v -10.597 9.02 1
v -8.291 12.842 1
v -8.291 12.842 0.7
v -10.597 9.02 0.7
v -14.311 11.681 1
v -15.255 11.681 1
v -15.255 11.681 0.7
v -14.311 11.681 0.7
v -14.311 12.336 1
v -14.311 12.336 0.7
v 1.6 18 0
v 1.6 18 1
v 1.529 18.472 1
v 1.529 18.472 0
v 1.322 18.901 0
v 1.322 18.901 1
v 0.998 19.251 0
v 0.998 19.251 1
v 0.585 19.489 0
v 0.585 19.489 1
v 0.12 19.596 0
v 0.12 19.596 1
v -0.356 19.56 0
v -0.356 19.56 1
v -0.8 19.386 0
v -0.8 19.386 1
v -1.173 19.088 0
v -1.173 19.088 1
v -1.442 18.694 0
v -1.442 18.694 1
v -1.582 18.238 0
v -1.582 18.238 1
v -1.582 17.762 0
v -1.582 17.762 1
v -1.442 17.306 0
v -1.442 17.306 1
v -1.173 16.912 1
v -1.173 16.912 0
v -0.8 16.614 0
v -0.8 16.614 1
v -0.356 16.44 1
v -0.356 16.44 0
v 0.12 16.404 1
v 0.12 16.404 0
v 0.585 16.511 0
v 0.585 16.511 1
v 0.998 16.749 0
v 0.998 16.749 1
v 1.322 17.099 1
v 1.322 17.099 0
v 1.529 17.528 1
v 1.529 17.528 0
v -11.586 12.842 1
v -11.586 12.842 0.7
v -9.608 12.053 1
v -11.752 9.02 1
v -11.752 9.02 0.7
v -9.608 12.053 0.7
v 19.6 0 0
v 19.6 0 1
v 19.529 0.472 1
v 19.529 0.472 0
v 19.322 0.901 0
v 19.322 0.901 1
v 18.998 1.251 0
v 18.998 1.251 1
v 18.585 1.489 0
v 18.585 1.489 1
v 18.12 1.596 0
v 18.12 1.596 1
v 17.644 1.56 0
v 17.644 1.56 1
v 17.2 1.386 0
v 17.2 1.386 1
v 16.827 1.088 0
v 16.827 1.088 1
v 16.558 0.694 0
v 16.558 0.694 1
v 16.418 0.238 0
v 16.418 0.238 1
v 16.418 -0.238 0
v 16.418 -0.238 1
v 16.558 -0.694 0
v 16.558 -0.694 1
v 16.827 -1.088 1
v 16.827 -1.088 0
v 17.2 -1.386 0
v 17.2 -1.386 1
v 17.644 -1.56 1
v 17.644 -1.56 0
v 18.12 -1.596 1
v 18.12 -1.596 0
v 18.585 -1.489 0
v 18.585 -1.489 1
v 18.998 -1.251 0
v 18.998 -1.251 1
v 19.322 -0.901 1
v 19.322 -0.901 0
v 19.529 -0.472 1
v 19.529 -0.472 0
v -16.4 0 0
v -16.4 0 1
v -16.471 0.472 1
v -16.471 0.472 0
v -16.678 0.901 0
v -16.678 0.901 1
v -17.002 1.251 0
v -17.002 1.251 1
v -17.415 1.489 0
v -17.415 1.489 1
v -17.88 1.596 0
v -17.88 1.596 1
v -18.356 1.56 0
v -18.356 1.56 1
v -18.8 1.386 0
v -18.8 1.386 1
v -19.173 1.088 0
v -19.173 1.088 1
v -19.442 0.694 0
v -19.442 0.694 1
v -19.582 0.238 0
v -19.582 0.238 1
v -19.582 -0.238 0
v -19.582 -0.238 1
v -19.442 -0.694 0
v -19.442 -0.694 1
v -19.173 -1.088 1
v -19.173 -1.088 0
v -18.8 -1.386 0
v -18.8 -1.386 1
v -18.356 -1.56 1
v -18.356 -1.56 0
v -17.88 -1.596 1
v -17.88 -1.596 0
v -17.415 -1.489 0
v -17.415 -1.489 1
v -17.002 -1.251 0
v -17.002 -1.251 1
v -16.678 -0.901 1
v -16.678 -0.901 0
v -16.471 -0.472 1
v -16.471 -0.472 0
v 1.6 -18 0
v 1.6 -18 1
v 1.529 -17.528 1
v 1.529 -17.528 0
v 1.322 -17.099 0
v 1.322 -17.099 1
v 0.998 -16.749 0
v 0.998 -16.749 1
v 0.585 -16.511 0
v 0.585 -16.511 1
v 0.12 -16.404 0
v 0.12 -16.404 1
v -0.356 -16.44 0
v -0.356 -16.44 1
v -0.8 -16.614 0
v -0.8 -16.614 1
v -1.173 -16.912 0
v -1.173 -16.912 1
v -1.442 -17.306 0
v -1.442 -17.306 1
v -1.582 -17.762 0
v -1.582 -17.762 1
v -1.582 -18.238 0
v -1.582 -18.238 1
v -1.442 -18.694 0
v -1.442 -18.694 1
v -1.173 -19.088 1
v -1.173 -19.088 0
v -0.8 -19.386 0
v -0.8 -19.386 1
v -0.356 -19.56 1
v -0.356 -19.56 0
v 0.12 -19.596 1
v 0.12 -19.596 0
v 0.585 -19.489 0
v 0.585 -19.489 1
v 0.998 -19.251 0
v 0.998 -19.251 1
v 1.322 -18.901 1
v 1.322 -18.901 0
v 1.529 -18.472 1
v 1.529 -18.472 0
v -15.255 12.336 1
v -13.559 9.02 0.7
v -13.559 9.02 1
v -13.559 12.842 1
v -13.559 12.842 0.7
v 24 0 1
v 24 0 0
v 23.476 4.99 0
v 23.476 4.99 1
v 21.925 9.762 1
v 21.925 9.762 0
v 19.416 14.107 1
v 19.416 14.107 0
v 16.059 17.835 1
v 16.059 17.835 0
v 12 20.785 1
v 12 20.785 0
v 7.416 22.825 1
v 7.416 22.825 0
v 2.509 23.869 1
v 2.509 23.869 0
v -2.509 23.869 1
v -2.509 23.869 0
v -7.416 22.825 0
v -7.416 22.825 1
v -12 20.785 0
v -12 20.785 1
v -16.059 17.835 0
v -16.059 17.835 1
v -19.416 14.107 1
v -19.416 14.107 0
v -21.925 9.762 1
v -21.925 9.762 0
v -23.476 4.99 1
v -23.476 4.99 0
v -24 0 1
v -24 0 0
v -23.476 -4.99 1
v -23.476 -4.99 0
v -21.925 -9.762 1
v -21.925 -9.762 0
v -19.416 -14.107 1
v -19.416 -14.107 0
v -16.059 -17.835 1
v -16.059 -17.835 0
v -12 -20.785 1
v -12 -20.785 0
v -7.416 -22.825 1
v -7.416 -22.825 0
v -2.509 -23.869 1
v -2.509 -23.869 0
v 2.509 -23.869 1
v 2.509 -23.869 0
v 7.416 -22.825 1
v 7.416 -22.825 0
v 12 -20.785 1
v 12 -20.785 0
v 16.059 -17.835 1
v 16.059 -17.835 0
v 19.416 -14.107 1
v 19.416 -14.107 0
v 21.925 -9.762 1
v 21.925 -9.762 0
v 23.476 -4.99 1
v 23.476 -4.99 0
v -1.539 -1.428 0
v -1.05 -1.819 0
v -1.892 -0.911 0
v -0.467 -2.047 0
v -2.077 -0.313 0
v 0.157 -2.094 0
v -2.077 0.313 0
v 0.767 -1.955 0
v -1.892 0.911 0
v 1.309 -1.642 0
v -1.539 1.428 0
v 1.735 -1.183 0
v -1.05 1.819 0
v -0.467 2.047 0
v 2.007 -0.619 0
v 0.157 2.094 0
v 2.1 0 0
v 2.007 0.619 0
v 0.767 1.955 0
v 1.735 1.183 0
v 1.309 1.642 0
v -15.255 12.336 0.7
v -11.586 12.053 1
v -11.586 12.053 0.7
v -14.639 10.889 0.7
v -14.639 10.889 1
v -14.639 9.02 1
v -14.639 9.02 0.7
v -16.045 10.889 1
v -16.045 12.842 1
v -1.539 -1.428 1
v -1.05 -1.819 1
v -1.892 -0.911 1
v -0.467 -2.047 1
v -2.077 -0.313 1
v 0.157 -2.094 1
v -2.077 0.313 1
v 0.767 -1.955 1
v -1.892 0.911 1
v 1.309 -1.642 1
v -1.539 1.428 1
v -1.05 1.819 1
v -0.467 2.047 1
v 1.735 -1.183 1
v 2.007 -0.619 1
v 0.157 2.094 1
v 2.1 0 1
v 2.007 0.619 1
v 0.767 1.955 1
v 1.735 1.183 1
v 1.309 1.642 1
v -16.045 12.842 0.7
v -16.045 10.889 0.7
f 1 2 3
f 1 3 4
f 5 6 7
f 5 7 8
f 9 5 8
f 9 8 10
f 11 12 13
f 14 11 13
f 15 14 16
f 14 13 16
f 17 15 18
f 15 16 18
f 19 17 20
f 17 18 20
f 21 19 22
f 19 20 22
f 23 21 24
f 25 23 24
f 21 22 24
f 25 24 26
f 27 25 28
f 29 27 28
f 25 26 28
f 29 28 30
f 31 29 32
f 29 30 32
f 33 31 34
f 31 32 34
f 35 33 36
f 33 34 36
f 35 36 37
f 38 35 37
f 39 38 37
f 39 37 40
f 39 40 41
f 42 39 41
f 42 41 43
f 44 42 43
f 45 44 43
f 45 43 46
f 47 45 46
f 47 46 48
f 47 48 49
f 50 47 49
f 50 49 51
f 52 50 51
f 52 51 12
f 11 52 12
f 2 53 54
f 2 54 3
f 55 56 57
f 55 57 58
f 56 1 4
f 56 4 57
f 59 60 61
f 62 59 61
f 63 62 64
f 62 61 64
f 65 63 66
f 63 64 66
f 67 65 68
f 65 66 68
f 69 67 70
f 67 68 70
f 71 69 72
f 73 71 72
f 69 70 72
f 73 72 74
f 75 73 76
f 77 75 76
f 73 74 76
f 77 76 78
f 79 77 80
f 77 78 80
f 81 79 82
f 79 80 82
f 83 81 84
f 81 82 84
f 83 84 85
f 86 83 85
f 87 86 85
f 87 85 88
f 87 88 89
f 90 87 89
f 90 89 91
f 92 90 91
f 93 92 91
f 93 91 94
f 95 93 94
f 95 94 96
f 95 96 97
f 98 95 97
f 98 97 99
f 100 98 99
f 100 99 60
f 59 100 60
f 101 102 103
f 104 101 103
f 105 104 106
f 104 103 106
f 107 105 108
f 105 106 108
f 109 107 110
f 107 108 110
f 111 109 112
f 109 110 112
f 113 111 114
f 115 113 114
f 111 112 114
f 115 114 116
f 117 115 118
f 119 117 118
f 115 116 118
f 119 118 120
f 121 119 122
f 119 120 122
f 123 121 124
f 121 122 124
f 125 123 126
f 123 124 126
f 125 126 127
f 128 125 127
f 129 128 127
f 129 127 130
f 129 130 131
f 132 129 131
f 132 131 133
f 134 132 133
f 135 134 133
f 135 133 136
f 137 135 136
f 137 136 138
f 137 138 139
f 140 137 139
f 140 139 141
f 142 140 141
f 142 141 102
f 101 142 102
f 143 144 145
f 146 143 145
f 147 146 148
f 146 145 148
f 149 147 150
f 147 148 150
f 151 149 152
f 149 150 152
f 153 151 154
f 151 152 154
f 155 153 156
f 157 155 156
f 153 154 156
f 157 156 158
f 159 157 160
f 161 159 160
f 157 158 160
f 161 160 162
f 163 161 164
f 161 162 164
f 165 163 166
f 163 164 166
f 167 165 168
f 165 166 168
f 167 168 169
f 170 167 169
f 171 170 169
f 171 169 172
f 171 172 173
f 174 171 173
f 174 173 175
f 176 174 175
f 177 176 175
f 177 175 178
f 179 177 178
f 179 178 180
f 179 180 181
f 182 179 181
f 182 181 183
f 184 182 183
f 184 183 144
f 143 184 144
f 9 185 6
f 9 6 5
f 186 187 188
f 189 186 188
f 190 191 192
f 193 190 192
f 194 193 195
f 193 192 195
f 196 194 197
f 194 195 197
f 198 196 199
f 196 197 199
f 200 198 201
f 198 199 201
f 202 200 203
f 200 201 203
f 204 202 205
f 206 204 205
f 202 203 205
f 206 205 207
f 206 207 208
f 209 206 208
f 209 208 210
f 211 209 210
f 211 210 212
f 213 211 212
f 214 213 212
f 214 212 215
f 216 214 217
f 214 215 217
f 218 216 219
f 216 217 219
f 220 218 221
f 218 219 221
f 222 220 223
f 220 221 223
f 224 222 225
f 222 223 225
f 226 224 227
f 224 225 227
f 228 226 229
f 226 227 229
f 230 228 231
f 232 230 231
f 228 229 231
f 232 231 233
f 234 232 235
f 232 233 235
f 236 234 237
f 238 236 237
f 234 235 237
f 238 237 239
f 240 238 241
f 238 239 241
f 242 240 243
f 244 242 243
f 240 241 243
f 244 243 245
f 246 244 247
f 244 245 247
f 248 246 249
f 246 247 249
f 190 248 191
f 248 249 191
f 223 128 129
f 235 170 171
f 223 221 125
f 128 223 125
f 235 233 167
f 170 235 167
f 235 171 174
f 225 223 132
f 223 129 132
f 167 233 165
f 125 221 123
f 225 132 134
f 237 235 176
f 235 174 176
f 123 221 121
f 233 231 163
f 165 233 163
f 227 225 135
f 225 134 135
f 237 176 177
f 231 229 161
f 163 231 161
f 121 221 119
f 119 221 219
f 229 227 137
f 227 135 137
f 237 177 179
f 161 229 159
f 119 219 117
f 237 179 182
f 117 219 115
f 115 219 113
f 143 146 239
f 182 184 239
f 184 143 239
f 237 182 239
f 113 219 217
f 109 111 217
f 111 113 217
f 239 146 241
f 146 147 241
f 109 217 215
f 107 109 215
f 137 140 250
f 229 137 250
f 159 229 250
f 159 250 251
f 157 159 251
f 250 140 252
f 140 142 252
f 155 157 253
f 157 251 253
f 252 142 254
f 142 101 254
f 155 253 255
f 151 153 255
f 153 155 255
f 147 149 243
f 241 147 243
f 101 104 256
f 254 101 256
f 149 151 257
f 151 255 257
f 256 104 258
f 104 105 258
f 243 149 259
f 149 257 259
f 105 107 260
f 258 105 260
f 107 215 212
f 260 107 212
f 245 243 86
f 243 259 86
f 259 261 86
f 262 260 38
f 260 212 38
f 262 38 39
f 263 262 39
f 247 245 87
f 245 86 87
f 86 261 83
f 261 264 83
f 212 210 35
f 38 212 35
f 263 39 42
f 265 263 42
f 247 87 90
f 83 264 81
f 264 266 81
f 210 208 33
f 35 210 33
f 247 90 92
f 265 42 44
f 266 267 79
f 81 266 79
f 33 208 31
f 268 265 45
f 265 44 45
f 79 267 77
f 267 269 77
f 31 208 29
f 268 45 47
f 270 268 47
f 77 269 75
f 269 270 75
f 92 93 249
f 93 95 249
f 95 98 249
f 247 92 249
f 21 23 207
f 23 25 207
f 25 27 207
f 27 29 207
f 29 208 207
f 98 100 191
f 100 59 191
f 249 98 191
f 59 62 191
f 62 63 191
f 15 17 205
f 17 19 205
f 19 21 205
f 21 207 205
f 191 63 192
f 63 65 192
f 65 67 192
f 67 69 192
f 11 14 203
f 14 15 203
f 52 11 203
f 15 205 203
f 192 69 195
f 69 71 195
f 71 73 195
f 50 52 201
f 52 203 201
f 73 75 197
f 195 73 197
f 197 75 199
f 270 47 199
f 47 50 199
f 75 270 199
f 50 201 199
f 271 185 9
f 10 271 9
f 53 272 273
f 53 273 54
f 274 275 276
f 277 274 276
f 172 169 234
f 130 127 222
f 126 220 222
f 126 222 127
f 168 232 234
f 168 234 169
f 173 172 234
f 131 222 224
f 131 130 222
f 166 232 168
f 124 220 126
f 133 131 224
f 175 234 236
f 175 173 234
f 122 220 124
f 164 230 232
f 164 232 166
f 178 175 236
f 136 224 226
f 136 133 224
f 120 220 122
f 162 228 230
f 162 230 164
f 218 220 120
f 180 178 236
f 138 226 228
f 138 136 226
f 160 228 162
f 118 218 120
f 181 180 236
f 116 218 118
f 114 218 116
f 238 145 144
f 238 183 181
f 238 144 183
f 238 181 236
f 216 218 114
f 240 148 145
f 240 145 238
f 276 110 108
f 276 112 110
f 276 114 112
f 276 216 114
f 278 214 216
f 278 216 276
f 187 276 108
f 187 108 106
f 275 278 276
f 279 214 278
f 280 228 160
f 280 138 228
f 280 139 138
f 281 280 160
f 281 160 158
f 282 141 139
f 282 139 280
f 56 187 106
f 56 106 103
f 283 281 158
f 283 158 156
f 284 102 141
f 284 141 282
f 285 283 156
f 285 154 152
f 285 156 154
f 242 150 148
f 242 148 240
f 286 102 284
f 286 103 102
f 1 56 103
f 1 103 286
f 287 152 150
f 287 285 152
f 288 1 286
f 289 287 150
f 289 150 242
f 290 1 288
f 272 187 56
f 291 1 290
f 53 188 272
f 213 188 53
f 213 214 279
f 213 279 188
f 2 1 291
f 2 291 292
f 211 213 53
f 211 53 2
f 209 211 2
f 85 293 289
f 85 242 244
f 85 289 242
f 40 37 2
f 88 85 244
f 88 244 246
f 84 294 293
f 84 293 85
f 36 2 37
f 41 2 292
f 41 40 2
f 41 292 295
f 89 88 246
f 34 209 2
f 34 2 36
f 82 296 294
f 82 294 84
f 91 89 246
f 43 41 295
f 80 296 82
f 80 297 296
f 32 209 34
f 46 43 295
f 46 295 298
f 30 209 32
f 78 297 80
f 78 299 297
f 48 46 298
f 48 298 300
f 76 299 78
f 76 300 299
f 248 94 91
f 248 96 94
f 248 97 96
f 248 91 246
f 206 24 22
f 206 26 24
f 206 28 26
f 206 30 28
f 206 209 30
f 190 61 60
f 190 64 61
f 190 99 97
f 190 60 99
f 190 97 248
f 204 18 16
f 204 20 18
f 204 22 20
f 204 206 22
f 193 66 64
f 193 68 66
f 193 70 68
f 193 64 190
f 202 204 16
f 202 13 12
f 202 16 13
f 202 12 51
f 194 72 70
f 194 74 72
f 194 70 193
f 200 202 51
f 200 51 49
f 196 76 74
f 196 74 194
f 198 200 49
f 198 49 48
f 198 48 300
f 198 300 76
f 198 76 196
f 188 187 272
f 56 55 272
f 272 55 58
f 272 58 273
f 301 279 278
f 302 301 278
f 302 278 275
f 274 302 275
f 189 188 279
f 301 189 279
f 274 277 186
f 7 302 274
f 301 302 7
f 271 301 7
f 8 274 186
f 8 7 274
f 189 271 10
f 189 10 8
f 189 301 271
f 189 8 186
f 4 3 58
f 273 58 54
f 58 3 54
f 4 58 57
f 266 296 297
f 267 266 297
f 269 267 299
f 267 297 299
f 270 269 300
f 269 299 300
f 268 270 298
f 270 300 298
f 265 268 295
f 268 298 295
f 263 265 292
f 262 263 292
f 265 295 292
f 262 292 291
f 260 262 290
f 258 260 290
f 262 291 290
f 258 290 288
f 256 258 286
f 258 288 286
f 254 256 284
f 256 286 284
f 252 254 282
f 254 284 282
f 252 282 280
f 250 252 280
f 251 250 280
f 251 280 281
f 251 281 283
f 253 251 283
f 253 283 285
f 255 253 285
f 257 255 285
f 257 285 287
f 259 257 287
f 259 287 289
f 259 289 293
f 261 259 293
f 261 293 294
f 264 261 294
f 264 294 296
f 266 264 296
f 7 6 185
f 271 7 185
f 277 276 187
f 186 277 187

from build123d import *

# Parameters (mm, degrees)
SKETCH1_R           = 24
BOSS_EXTRUDE1_DEPTH = 1
SKETCH3_R           = 2.1
CUT_EXTRUDE2_DEPTH  = 2
SKETCH2_R           = 1.6
CUT_EXTRUDE3_DEPTH  = 2
SKETCH4_W           = 0.94378815
SKETCH4_H           = 0.65487341
CUT_EXTRUDE4_DEPTH  = 0.3


with BuildPart() as part:
    # Sketch1 → Boss-Extrude1 (new body)
    with BuildSketch(Plane.XY):
        Circle(SKETCH1_R)
    extrude(amount=BOSS_EXTRUDE1_DEPTH)

    # Sketch3 → Cut-Extrude2 (cut)
    with BuildSketch(Plane.XY.offset(1)):
        Circle(SKETCH3_R)
    extrude(amount=-CUT_EXTRUDE2_DEPTH, mode=Mode.SUBTRACT)

    # Sketch2 → Cut-Extrude3 (cut, through all)
    with BuildSketch(Plane.XY.offset(1)):
        with Locations((-18, 0)):
            Circle(SKETCH2_R)
        with Locations((0, 18)):
            Circle(SKETCH2_R)
        with Locations((18, 0)):
            Circle(SKETCH2_R)
        with Locations((0, -18)):
            Circle(SKETCH2_R)
    extrude(amount=-CUT_EXTRUDE3_DEPTH, mode=Mode.SUBTRACT)

    # Sketch4 → Cut-Extrude4 (cut)
    with BuildSketch(Plane.XY.offset(1)):
        Polygon((-11.58574855, 12.841946562), (-8.291473373, 12.841946562), (-10.597161191, 9.019905494), (-11.751924249, 9.019905494), (-9.607705981, 12.052611994), (-11.58574855, 12.052611994), align=None)
        Polygon((-13.559084971, 12.841946562), (-16.044695483, 12.841946562), (-16.044695483, 10.889382104), (-14.639227012, 10.889382104), (-14.639227012, 9.019905494), (-13.559084971, 9.019905494), align=None)
        with Locations((-14.783101119, 12.008686539)):
            Rectangle(SKETCH4_W, SKETCH4_H, mode=Mode.SUBTRACT)
    extrude(amount=-CUT_EXTRUDE4_DEPTH, mode=Mode.SUBTRACT)


solid = part.part
